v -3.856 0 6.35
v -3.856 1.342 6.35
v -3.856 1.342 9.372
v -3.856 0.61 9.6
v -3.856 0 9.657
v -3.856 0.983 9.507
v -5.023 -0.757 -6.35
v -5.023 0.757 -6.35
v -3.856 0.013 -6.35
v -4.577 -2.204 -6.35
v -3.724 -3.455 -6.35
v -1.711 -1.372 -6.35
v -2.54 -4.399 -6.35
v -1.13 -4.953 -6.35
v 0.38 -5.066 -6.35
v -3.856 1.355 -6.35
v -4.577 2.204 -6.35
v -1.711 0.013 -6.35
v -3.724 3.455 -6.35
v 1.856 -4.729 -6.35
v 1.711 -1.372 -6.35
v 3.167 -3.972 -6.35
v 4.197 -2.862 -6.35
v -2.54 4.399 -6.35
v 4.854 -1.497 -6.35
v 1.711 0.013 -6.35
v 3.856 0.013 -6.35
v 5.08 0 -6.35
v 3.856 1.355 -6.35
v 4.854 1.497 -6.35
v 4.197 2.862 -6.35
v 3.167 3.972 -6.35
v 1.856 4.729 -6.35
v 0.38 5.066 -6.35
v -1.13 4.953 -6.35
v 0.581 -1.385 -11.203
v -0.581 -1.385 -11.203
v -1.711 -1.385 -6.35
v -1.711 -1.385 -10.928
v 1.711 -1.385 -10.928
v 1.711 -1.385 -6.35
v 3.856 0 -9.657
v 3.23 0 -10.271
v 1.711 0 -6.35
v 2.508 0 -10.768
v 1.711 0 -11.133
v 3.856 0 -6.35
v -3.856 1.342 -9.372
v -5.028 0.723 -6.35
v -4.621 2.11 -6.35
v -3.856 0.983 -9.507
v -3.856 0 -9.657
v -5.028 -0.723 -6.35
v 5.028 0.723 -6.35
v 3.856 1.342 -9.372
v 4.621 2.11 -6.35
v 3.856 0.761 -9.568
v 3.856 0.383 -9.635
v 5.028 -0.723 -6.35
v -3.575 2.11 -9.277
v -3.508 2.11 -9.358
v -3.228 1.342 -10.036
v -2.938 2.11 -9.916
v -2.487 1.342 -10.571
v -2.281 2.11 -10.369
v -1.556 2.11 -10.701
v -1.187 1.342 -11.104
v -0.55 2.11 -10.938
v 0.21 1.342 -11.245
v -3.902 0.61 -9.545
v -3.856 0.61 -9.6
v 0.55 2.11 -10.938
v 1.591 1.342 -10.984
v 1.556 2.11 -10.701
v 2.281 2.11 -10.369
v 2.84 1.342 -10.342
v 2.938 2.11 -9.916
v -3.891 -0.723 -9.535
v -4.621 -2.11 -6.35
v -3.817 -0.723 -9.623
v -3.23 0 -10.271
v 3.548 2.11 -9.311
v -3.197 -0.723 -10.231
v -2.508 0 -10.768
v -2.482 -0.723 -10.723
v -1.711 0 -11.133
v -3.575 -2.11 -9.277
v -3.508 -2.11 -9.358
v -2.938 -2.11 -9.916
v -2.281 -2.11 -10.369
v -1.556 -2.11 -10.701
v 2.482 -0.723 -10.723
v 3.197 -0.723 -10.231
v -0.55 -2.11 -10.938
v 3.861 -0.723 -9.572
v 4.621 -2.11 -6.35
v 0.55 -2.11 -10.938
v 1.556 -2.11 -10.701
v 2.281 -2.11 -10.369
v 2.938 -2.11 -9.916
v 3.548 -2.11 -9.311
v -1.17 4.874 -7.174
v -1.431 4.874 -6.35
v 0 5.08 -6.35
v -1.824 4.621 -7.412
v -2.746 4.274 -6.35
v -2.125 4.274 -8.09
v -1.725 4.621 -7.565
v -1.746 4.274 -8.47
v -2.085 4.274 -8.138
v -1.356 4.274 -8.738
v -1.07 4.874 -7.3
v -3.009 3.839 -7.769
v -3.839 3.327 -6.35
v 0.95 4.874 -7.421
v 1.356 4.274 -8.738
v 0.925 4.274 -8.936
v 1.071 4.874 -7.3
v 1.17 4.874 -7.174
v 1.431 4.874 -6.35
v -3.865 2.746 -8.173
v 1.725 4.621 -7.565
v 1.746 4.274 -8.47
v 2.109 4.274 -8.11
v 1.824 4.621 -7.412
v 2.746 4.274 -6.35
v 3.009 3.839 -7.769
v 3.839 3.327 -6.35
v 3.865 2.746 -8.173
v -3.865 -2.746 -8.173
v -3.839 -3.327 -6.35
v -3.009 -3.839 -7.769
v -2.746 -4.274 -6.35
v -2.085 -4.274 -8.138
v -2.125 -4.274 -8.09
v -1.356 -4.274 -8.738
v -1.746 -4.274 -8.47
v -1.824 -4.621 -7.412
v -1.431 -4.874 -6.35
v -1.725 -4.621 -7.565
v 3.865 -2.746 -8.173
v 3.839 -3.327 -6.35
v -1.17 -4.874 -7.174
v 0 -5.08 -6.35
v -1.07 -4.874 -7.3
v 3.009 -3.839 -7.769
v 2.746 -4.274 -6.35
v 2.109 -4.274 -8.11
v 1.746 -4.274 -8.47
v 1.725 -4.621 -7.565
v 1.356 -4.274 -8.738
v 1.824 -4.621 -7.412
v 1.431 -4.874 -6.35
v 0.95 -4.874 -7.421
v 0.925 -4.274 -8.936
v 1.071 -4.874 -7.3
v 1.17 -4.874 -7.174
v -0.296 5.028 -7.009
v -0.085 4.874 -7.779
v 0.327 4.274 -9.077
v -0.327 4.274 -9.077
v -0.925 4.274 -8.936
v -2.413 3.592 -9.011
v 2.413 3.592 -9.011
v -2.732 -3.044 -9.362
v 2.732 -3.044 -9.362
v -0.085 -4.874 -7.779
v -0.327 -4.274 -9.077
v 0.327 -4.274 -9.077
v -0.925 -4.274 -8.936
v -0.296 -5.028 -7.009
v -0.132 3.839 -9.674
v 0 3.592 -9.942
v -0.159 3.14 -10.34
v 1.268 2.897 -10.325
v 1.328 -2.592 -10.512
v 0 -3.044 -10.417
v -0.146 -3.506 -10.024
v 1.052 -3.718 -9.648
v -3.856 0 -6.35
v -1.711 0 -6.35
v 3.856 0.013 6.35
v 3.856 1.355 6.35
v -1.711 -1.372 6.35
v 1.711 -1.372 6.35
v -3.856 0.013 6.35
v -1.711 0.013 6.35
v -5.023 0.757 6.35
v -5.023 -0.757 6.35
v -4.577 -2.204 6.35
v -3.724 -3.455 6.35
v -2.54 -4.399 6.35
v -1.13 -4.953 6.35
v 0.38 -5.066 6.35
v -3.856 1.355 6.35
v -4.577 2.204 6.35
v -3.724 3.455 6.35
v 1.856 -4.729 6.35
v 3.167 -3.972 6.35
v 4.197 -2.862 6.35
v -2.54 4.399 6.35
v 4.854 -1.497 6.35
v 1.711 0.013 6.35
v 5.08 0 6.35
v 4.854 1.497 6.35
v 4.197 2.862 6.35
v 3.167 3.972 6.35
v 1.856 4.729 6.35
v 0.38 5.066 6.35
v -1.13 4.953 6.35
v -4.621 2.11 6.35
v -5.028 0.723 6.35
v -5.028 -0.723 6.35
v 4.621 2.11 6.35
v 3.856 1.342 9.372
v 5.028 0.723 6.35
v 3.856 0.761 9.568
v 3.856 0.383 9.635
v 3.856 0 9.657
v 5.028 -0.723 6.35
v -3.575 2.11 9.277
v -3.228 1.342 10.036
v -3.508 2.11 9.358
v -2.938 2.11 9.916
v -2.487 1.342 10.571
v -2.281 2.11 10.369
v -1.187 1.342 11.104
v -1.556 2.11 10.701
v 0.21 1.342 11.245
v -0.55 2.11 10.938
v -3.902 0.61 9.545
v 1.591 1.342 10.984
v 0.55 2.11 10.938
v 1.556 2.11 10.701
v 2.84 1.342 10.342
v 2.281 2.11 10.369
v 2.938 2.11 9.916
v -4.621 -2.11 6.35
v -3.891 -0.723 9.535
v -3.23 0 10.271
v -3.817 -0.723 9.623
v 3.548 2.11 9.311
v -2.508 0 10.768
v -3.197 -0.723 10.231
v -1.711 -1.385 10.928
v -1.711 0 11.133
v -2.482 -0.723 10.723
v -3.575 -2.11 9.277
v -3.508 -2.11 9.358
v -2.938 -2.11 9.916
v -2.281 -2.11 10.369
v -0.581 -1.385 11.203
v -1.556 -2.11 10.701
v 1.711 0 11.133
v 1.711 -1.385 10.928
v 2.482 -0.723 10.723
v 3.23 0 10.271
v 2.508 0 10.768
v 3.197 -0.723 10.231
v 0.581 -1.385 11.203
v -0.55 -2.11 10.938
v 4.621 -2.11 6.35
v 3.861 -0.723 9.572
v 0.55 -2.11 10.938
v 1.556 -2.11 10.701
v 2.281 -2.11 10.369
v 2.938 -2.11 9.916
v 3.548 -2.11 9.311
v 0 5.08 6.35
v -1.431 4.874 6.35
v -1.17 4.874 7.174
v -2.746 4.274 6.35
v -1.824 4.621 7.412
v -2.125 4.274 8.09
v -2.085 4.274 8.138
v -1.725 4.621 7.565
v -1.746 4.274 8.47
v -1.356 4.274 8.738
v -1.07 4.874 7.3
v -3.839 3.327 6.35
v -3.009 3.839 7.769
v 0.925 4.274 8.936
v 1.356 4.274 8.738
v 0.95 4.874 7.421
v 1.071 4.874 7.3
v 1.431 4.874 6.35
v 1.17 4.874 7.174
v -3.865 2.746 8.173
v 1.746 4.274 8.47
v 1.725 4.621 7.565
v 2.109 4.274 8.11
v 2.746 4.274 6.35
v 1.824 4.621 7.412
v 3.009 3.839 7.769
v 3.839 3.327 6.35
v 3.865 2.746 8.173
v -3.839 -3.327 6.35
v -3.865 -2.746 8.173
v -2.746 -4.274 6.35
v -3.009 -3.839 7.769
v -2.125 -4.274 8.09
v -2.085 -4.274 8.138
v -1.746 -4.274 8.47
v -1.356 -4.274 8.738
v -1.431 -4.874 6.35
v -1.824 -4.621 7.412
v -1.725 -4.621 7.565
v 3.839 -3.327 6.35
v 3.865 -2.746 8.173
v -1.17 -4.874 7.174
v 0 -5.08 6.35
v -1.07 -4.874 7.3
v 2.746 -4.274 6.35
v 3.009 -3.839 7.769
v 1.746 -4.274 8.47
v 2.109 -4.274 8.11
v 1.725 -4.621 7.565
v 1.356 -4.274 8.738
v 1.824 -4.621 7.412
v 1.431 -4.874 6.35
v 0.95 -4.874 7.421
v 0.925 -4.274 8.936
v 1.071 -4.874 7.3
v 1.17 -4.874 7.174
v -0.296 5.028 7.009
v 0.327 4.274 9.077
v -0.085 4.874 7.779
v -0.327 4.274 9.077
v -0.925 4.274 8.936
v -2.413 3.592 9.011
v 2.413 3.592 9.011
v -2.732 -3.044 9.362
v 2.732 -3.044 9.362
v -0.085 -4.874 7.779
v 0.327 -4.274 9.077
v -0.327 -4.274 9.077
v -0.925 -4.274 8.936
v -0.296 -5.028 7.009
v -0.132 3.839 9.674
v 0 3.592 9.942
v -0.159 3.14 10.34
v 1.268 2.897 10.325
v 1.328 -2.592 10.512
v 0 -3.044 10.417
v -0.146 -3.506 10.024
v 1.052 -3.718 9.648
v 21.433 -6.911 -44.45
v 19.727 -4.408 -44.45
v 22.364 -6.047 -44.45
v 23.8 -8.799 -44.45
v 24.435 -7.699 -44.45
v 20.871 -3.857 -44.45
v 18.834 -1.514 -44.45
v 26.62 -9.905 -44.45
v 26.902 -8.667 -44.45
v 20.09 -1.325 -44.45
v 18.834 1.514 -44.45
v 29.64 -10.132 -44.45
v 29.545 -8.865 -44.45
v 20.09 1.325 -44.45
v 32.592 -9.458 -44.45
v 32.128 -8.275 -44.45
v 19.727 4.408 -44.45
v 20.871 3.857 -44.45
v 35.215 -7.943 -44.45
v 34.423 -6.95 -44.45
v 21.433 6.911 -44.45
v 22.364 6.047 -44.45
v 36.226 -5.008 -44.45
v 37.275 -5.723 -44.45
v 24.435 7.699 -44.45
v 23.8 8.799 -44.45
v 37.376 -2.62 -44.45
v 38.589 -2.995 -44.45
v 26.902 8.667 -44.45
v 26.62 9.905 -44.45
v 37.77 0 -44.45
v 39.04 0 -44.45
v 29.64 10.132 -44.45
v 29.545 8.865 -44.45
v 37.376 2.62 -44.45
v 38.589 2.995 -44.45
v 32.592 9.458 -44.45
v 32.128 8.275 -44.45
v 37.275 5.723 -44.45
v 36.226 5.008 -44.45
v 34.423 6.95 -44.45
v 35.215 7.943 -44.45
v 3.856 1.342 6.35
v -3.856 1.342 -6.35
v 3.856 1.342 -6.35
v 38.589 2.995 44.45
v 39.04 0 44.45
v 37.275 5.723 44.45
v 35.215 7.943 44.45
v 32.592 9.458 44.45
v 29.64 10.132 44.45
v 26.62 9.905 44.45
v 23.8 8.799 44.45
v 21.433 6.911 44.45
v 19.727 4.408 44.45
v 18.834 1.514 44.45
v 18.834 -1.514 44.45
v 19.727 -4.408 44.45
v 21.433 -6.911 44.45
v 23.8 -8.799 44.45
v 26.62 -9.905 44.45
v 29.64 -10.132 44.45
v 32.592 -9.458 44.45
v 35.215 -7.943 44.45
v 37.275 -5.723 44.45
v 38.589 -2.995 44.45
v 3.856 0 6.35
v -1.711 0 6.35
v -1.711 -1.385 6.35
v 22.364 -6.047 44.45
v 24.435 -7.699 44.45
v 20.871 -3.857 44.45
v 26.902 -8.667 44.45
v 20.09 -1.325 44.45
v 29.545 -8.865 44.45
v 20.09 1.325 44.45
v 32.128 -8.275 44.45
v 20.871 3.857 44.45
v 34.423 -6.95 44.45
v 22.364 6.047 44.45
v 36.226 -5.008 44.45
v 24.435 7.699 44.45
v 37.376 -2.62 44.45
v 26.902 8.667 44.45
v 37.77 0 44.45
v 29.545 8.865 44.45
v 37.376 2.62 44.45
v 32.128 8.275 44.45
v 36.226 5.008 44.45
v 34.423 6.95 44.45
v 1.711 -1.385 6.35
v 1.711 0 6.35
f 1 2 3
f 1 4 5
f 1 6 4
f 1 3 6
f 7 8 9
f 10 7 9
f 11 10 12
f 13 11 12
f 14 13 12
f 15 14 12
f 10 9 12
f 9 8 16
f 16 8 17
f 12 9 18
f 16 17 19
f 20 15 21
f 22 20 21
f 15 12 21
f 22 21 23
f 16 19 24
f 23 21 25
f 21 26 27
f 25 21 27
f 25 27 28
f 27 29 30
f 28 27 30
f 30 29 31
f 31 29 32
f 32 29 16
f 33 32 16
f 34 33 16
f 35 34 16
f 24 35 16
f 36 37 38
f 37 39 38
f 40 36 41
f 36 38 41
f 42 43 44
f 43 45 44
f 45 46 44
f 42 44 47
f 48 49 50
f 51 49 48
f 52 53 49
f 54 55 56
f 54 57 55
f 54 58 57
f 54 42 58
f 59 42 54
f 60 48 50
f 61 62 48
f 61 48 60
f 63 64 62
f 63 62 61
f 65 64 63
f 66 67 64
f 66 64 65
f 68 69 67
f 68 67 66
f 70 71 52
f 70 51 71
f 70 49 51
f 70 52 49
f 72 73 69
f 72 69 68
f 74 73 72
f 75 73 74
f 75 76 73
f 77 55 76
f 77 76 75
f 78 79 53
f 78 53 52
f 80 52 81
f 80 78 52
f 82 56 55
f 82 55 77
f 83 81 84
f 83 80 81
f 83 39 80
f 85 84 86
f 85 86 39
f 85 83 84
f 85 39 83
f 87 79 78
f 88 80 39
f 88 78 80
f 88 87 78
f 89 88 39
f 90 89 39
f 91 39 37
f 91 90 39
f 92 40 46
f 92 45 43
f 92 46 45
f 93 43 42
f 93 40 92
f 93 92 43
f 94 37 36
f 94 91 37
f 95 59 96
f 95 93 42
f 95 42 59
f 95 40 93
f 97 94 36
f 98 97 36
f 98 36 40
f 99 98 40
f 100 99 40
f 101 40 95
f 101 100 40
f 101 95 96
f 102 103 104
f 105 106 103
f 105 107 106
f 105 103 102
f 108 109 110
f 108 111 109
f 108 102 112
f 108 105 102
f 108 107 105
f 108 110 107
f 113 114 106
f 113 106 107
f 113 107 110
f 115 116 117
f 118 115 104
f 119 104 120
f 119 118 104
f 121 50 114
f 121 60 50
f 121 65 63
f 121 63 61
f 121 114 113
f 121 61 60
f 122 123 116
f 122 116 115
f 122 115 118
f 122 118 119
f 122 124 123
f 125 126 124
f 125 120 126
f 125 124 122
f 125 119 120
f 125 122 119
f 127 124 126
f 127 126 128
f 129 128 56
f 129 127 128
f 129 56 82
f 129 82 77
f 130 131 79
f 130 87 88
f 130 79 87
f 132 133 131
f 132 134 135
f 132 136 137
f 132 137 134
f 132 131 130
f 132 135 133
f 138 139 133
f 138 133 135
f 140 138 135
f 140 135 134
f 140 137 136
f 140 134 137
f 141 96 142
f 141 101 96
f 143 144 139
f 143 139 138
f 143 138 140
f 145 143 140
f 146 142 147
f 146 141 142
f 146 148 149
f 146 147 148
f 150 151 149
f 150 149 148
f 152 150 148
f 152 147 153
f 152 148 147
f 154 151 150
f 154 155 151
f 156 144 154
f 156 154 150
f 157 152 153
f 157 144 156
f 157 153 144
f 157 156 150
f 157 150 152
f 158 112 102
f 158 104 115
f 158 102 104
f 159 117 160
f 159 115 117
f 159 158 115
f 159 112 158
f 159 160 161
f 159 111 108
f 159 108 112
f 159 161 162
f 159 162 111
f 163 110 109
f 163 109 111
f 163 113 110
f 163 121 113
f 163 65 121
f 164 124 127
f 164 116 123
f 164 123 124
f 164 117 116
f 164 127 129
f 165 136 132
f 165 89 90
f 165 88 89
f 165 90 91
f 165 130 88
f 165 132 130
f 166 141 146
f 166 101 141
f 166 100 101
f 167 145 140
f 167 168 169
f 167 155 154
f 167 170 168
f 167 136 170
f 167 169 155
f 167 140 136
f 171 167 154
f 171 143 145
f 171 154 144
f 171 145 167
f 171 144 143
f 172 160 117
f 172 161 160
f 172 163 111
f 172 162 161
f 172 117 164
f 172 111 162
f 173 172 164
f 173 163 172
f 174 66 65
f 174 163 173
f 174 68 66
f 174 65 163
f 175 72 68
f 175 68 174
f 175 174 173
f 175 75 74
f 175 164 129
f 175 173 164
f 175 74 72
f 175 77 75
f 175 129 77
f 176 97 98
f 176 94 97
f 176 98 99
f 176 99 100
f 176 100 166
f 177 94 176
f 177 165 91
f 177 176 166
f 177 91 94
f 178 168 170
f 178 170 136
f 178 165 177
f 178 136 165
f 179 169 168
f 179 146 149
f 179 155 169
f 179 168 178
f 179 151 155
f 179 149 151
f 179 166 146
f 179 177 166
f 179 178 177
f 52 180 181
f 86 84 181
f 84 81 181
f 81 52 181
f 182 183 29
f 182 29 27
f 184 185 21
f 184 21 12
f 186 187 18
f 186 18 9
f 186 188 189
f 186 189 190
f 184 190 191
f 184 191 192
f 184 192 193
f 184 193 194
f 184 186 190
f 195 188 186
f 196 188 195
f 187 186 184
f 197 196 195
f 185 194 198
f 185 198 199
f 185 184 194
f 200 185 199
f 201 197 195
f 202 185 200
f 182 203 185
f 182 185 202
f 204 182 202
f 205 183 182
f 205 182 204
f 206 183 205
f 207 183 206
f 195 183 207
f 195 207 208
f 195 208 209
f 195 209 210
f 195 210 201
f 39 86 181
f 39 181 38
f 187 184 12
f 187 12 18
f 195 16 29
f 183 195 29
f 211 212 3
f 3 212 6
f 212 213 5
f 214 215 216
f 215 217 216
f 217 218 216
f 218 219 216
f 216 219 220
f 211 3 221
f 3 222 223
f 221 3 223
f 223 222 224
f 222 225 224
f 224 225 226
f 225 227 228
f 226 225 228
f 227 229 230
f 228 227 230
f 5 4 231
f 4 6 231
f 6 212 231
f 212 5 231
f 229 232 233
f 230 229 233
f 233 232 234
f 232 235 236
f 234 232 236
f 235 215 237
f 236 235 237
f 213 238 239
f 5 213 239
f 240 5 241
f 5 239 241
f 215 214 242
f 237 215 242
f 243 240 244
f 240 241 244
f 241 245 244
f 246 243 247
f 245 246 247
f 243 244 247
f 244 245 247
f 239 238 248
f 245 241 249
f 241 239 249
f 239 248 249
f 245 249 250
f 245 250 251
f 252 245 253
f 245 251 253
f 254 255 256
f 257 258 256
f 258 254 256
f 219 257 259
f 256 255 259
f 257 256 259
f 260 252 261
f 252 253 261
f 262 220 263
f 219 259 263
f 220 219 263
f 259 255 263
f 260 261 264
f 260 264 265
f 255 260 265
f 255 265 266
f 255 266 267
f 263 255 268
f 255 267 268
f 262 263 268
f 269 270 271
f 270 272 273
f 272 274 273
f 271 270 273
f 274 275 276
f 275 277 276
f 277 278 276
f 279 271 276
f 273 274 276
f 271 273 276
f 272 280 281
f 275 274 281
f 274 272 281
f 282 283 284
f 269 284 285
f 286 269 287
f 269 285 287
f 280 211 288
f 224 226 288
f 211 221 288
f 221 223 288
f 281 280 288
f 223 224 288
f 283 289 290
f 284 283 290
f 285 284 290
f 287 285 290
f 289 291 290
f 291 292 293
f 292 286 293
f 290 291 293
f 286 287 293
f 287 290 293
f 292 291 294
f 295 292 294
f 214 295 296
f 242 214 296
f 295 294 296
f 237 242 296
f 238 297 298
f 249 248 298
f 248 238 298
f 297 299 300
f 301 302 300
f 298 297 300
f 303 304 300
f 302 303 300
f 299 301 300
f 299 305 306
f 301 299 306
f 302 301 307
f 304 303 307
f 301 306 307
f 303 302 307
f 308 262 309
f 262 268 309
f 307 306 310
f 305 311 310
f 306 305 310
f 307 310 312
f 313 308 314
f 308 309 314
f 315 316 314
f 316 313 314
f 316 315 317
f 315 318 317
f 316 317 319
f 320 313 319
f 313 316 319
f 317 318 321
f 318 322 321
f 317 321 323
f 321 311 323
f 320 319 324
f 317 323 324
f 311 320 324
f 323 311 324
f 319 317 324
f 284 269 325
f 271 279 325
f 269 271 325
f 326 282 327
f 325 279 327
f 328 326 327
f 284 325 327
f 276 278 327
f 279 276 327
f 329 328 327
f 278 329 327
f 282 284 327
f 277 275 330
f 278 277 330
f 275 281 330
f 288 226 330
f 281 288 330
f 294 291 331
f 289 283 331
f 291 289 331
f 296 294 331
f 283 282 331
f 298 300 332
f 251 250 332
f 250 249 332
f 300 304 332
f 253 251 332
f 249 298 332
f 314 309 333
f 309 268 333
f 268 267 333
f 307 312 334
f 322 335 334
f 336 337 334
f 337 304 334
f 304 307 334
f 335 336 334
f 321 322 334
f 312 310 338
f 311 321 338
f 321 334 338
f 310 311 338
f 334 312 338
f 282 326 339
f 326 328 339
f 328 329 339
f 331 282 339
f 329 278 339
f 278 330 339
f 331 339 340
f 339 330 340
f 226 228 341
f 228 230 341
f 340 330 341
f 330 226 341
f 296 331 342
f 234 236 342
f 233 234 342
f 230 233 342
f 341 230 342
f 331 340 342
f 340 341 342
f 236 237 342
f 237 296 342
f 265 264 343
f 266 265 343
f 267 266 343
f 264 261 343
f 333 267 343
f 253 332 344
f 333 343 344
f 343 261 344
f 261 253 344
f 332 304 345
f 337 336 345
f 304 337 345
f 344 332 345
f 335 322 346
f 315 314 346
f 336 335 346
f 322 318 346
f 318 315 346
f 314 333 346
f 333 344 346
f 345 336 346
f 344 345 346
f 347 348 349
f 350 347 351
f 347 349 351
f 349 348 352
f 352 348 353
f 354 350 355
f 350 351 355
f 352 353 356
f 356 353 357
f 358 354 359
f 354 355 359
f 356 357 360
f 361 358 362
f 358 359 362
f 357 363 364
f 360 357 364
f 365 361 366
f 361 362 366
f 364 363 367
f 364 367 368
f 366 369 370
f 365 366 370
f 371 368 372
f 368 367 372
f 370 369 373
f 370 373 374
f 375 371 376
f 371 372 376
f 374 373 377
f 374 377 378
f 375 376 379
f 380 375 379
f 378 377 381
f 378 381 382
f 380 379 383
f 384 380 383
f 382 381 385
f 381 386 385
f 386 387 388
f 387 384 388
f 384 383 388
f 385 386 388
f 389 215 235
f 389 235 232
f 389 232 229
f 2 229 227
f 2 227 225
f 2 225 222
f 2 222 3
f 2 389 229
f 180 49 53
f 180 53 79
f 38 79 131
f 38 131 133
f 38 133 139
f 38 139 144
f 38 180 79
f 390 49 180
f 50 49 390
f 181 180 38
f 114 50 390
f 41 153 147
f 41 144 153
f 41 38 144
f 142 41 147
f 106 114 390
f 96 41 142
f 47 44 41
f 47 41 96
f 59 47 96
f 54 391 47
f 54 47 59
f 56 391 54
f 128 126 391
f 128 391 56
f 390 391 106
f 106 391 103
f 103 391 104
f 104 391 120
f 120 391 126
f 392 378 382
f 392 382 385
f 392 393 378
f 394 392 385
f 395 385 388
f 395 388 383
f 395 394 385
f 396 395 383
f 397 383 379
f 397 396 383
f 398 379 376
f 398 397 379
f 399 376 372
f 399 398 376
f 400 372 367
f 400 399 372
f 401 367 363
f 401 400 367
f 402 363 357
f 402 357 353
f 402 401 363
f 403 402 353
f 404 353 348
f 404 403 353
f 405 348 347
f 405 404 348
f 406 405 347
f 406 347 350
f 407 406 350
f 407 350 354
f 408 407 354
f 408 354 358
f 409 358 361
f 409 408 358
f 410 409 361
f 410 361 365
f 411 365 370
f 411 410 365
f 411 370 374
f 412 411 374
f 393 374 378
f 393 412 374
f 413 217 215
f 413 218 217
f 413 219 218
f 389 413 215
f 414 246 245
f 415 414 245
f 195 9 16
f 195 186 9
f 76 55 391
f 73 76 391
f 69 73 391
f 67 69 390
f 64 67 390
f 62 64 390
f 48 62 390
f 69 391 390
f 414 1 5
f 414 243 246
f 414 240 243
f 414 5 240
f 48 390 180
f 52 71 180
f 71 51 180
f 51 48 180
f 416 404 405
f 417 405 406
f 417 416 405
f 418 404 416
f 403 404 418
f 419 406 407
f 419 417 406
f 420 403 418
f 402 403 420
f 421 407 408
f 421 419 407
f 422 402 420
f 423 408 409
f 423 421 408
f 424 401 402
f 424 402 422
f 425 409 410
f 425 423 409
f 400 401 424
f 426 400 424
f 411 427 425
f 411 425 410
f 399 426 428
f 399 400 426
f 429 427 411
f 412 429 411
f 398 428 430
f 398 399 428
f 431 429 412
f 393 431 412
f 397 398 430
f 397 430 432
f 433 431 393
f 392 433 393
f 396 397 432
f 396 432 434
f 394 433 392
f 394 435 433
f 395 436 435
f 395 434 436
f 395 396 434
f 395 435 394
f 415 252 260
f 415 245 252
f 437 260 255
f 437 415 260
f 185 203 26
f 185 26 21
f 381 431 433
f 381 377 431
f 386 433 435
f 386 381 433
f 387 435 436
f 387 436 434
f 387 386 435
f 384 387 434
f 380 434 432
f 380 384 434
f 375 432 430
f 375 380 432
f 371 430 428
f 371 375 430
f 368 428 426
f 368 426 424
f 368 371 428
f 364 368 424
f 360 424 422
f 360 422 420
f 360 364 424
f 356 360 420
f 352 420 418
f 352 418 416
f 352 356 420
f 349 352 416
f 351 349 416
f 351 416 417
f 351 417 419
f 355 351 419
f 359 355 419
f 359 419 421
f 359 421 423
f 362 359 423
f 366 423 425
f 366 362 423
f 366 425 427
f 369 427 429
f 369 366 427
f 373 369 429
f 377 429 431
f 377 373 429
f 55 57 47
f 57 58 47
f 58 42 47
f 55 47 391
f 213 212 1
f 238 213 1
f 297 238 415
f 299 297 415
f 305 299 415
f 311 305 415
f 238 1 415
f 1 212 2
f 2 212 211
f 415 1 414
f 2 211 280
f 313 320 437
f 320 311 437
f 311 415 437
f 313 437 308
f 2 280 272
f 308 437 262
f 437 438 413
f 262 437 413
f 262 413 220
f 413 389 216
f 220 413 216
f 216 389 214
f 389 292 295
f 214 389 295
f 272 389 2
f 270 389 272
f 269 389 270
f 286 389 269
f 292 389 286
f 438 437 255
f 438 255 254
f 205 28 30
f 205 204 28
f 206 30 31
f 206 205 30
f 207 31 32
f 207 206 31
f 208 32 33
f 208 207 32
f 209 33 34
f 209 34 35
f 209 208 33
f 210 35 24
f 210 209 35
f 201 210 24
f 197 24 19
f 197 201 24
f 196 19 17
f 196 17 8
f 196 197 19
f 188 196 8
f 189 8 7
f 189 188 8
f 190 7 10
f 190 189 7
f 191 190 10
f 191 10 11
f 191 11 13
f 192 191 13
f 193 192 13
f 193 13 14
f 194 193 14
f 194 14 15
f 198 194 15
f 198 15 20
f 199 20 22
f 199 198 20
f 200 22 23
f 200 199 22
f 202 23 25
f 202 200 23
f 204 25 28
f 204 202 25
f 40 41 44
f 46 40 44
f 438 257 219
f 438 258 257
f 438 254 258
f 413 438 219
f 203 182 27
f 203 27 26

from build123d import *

# Parameters (mm, degrees)
F5_ANGLE       = 180
F6_DEPTH       = 18
F7_REACH       = 9.8039879523
F8_ANGLE       = 180
F9_REACH       = 9.8039879523
F0_R           = 5.08
F10_DEPTH      = 6.35
F10_DEPTH_BACK = 6.35
F11_R          = 10.16
F11_R_2        = 8.89
F12_DEPTH      = 44.45


# Not quite as in the source:
# - after a boolean that leaves OpenCascade's solid faulty, fix() repairs it
# - an extrude ends at something that could not be found from the text; its depth is read off the source's solid
# - ends of sketch curves that miss each other by under 0.0002 mm in the source are joined


with BuildPart() as f5:
    # F3 (on offset) → F5 (revolve)
    with BuildSketch(Plane.XY.offset(6.35)):
        with BuildLine():
            Line((9.3459e-06, 1.341628), (0, 5.08))
            ThreePointArc((0, 5.08), (-5.08, -1.27e-05), (2.54e-05, -5.08))
            Line((2.54e-05, -5.08), (1.61626e-05, -1.3850366))
            Line((1.61626e-05, -1.3850366), (-1.7108932, -1.3850366))
            Line((-1.7108932, -1.3850366), (-1.7108932, 0))
            Line((-1.7108932, 0), (-3.8563804, 0))
            Line((-3.8563804, 0), (-3.8563804, 1.341628))
            Line((-3.8563804, 1.341628), (9.3459e-06, 1.341628))
        make_face()
        Polygon((0, 0), (0, 1.341628), (-3.8563804, 1.341628), (-3.8563804, 0), (-1.7108932, 0), (-1.7108932, -1.3850366), (1.61626e-05, -1.3850366), align=None)
    revolve(axis=Axis((1.27e-05, 0, 6.35), (-2.5e-06, 1, 0)), revolution_arc=F5_ANGLE)

    # F3 (on offset) → F6 (cut, through all)
    with BuildSketch(Plane.XY.offset(6.35)):
        Polygon((3.8563804, 1.341628), (0, 1.341628), (0, 0), (1.61626e-05, -1.3850366), (1.710944, -1.3850366), (1.710944, 0), (3.8563804, 0), align=None)
        Polygon((0, 0), (0, 1.341628), (-3.8563804, 1.341628), (-3.8563804, 0), (-1.7108932, 0), (-1.7108932, -1.3850366), (1.61626e-05, -1.3850366), align=None)
    extrude(amount=-F6_DEPTH, mode=Mode.SUBTRACT)

    add(f5.part.fix(), mode=Mode.REPLACE)

    f7_end = f5.faces().sort_by_distance((1.27e-05, 0, 11.4300127))[0]
    # F3 (on offset) → F7 (cut, up to a face of the model that its end follows)
    with BuildSketch(Plane.XY.offset(6.35)):
        Polygon((0, 0), (0, 1.341628), (-3.8563804, 1.341628), (-3.8563804, 0), (-1.7108932, 0), (-1.7108932, -1.3850366), (1.61626e-05, -1.3850366), align=None)
        Polygon((3.8563804, 1.341628), (0, 1.341628), (0, 0), (1.61626e-05, -1.3850366), (1.710944, -1.3850366), (1.710944, 0), (3.8563804, 0), align=None)
    f7_long = extrude(amount=F7_REACH, mode=Mode.PRIVATE)
    add(split(f7_long, bisect_by=f7_end, keep=Keep.BOTTOM, mode=Mode.PRIVATE), mode=Mode.SUBTRACT)


with BuildPart() as f8:
    # F4 (on offset) → F8 (revolve)
    with BuildSketch(Plane.XY.offset(-6.35)):
        with BuildLine():
            Line((9.3459e-06, 1.341628), (0, 5.08))
            ThreePointArc((0, 5.08), (-5.08, -1.27e-05), (2.54e-05, -5.08))
            Line((2.54e-05, -5.08), (1.61626e-05, -1.3850366))
            Line((1.61626e-05, -1.3850366), (-1.7108932, -1.3850366))
            Line((-1.7108932, -1.3850366), (-1.7108932, 0))
            Line((-1.7108932, 0), (-3.8563804, 0))
            Line((-3.8563804, 0), (-3.8563804, 1.341628))
            Line((-3.8563804, 1.341628), (9.3459e-06, 1.341628))
        make_face()
        Polygon((0, 0), (0, 1.341628), (-3.8563804, 1.341628), (-3.8563804, 0), (-1.7108932, 0), (-1.7108932, -1.3850366), (1.61626e-05, -1.3850366), align=None)
    revolve(axis=Axis((1.27e-05, 0, -6.35), (2.5e-06, -1, 0)), revolution_arc=F8_ANGLE)

    f9_end = f8.faces().sort_by_distance((1.27e-05, 0, -11.4300127))[0]
    # F4 (on offset) → F9 (cut, up to a face of the model that its end follows)
    with BuildSketch(Plane.XY.offset(-6.35)):
        Polygon((3.8563804, 1.341628), (0, 1.341628), (0, 0), (1.61626e-05, -1.3850366), (1.710944, -1.3850366), (1.710944, 0), (3.8563804, 0), align=None)
        Polygon((0, 0), (0, 1.341628), (-3.8563804, 1.341628), (-3.8563804, 0), (-1.7108932, 0), (-1.7108932, -1.3850366), (1.61626e-05, -1.3850366), align=None)
    f9_long = extrude(amount=-F9_REACH, mode=Mode.PRIVATE)
    add(split(f9_long, bisect_by=f9_end, keep=Keep.BOTTOM, mode=Mode.PRIVATE), mode=Mode.SUBTRACT)


with BuildPart() as f10:
    # F0 (on Top) → F10 (new body, two sides)
    with BuildSketch(Plane.XY) as f10_sk:
        Circle(F0_R)
        Polygon((-3.856369298, 1.3546424612), (0, 1.3546424612), (3.856369298, 1.3546424612), (3.856369298, 0.013024848), (1.7109218004, 0.013024848), (1.7109218004, -1.3720089252), (0, -1.3720089252), (-1.7109218004, -1.3720089252), (-1.7109218004, 0.013024848), (-3.856369298, 0.013024848), align=None, mode=Mode.SUBTRACT)
    extrude(amount=F10_DEPTH)
    extrude(f10_sk.sketch, amount=-F10_DEPTH_BACK)


with BuildPart() as f12:
    # F11 (on Top) → F12 (new body, symmetric)
    with BuildSketch(Plane.XY):
        with Locations((28.880469501, 0)):
            Circle(F11_R)
        with Locations((28.880469501, 0)):
            Circle(F11_R_2, mode=Mode.SUBTRACT)
    extrude(amount=F12_DEPTH, both=True)


solid = Compound([f5.part, f8.part, f10.part, f12.part])
